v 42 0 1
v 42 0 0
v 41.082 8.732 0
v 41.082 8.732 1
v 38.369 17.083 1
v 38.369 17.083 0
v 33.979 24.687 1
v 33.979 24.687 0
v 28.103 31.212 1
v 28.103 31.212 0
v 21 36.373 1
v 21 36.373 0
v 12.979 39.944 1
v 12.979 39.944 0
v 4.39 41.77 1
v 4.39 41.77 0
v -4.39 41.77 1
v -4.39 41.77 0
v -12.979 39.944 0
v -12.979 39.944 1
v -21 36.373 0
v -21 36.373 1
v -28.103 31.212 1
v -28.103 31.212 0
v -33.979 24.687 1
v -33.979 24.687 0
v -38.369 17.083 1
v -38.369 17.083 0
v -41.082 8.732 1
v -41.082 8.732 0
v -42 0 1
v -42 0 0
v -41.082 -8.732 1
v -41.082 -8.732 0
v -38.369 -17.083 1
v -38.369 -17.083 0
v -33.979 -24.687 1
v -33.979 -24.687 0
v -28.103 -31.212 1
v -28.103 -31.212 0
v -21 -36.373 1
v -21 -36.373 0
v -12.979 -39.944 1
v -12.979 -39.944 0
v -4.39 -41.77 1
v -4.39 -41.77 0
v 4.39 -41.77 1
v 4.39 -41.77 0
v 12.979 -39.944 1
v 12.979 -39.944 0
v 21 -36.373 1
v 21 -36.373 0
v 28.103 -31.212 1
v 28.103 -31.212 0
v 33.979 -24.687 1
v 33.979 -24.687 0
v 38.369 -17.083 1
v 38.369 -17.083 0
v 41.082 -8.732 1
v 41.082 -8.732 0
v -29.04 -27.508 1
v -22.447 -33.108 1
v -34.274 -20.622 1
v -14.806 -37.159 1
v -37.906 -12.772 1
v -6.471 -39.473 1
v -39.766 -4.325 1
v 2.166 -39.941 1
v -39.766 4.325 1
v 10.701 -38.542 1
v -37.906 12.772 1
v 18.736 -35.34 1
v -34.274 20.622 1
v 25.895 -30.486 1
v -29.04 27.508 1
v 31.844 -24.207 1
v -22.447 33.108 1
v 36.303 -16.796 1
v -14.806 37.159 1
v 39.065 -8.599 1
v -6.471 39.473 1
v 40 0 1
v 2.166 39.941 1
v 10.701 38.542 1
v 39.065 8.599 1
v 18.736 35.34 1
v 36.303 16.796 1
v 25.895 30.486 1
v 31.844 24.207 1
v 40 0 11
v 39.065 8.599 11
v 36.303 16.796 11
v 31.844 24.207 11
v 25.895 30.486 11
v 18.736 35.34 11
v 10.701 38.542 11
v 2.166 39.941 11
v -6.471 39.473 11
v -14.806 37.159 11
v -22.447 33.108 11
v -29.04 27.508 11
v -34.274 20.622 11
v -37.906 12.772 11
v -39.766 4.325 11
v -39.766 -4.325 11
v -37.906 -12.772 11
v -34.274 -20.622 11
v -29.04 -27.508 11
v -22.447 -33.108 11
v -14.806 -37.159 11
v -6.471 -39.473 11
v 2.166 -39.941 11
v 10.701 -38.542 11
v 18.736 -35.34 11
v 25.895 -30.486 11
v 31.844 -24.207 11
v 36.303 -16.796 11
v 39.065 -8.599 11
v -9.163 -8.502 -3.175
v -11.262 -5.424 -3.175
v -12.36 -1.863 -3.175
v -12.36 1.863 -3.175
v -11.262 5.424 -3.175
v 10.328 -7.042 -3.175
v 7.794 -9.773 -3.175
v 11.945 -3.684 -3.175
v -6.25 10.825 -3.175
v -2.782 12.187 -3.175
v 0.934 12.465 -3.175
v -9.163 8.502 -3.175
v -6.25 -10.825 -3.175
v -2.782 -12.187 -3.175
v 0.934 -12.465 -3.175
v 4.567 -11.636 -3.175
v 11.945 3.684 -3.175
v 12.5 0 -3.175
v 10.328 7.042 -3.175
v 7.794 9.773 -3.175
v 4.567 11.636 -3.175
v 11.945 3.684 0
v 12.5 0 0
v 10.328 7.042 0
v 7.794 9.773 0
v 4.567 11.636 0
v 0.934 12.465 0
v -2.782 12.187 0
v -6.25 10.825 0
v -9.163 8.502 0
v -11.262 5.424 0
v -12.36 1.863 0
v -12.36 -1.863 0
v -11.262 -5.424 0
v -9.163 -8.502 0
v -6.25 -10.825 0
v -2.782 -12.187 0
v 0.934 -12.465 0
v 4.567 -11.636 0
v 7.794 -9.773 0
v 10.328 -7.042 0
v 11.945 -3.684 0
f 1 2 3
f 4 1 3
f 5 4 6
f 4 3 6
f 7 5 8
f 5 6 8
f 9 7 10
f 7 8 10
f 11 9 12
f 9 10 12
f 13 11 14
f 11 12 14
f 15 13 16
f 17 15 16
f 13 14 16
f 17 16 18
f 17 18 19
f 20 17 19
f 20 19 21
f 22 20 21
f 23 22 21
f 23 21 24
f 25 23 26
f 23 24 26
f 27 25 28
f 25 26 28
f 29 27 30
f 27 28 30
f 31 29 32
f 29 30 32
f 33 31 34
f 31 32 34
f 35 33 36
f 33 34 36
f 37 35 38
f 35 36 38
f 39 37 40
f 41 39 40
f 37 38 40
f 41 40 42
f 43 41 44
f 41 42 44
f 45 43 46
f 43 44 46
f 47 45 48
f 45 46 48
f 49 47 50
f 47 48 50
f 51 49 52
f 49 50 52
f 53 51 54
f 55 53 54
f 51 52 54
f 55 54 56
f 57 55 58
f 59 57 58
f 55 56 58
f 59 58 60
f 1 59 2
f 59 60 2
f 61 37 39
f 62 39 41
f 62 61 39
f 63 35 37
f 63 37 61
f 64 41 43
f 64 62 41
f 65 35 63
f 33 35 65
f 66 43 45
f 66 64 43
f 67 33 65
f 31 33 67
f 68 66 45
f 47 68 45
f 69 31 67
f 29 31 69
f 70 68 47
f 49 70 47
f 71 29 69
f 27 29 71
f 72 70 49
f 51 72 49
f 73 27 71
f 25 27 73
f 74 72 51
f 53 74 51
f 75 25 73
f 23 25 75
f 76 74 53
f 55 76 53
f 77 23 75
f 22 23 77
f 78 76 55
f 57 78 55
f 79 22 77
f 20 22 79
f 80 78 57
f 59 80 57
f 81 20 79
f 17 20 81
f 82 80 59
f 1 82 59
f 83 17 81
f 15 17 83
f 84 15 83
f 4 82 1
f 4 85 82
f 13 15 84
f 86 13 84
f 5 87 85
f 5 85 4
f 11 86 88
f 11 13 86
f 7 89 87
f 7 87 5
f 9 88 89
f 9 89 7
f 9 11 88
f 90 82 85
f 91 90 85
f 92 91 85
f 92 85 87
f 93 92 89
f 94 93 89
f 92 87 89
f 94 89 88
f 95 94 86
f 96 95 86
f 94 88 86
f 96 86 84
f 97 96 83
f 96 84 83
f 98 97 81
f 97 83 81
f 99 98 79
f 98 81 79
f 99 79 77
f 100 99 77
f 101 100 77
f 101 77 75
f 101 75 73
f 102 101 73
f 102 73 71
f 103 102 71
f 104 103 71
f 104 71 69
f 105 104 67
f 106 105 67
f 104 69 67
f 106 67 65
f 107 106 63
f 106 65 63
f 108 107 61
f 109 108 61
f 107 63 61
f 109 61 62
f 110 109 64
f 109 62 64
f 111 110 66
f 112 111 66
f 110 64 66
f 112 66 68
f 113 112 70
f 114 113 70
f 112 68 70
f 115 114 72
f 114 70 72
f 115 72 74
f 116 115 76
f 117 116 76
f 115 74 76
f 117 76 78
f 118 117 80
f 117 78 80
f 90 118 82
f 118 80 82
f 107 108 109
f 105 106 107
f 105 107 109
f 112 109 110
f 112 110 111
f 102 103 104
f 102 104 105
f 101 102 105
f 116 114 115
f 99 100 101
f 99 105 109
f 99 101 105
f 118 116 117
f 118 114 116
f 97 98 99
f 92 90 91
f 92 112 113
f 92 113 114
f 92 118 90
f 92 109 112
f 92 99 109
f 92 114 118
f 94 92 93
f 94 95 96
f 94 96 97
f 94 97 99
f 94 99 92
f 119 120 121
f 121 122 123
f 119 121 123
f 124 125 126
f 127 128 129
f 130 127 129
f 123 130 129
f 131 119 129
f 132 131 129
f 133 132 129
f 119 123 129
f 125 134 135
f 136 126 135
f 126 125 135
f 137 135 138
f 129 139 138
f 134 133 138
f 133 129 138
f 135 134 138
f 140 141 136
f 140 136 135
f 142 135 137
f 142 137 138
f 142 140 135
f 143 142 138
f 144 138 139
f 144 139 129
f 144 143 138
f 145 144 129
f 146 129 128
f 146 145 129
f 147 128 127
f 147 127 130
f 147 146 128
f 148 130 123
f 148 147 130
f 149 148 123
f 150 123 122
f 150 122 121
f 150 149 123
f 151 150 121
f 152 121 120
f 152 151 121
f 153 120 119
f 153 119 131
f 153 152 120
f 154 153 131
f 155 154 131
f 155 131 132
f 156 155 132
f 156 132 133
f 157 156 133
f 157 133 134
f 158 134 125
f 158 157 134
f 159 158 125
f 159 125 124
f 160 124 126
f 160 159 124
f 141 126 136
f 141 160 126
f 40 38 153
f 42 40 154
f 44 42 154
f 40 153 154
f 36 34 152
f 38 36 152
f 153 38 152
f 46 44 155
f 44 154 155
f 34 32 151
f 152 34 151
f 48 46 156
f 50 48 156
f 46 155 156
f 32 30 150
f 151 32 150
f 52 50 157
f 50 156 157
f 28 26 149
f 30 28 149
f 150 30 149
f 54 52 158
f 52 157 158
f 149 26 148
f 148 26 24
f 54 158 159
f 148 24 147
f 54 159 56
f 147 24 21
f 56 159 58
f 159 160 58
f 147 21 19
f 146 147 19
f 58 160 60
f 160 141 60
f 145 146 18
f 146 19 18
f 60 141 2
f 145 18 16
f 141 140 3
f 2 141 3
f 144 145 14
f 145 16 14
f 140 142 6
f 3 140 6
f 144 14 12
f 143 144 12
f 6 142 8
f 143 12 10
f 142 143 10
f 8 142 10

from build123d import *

# Parameters (mm, degrees)
SKETCH1_R           = 12.5
BOSS_EXTRUDE1_DEPTH = 3.175
SKETCH2_R           = 42
BOSS_EXTRUDE2_DEPTH = 1
SKETCH3_R           = 40
BOSS_EXTRUDE3_DEPTH = 10


with BuildPart() as part:
    # Sketch1 → Boss-Extrude1 (new body)
    with BuildSketch(Plane.XY):
        Circle(SKETCH1_R)
    extrude(amount=-BOSS_EXTRUDE1_DEPTH)

    # Sketch2 → Boss-Extrude2 (add)
    with BuildSketch(Plane.XY):
        Circle(SKETCH2_R)
    extrude(amount=BOSS_EXTRUDE2_DEPTH)

    # Sketch3 → Boss-Extrude3 (add)
    with BuildSketch(Plane.XY.offset(1)):
        Circle(SKETCH3_R)
    extrude(amount=BOSS_EXTRUDE3_DEPTH)


solid = part.part
